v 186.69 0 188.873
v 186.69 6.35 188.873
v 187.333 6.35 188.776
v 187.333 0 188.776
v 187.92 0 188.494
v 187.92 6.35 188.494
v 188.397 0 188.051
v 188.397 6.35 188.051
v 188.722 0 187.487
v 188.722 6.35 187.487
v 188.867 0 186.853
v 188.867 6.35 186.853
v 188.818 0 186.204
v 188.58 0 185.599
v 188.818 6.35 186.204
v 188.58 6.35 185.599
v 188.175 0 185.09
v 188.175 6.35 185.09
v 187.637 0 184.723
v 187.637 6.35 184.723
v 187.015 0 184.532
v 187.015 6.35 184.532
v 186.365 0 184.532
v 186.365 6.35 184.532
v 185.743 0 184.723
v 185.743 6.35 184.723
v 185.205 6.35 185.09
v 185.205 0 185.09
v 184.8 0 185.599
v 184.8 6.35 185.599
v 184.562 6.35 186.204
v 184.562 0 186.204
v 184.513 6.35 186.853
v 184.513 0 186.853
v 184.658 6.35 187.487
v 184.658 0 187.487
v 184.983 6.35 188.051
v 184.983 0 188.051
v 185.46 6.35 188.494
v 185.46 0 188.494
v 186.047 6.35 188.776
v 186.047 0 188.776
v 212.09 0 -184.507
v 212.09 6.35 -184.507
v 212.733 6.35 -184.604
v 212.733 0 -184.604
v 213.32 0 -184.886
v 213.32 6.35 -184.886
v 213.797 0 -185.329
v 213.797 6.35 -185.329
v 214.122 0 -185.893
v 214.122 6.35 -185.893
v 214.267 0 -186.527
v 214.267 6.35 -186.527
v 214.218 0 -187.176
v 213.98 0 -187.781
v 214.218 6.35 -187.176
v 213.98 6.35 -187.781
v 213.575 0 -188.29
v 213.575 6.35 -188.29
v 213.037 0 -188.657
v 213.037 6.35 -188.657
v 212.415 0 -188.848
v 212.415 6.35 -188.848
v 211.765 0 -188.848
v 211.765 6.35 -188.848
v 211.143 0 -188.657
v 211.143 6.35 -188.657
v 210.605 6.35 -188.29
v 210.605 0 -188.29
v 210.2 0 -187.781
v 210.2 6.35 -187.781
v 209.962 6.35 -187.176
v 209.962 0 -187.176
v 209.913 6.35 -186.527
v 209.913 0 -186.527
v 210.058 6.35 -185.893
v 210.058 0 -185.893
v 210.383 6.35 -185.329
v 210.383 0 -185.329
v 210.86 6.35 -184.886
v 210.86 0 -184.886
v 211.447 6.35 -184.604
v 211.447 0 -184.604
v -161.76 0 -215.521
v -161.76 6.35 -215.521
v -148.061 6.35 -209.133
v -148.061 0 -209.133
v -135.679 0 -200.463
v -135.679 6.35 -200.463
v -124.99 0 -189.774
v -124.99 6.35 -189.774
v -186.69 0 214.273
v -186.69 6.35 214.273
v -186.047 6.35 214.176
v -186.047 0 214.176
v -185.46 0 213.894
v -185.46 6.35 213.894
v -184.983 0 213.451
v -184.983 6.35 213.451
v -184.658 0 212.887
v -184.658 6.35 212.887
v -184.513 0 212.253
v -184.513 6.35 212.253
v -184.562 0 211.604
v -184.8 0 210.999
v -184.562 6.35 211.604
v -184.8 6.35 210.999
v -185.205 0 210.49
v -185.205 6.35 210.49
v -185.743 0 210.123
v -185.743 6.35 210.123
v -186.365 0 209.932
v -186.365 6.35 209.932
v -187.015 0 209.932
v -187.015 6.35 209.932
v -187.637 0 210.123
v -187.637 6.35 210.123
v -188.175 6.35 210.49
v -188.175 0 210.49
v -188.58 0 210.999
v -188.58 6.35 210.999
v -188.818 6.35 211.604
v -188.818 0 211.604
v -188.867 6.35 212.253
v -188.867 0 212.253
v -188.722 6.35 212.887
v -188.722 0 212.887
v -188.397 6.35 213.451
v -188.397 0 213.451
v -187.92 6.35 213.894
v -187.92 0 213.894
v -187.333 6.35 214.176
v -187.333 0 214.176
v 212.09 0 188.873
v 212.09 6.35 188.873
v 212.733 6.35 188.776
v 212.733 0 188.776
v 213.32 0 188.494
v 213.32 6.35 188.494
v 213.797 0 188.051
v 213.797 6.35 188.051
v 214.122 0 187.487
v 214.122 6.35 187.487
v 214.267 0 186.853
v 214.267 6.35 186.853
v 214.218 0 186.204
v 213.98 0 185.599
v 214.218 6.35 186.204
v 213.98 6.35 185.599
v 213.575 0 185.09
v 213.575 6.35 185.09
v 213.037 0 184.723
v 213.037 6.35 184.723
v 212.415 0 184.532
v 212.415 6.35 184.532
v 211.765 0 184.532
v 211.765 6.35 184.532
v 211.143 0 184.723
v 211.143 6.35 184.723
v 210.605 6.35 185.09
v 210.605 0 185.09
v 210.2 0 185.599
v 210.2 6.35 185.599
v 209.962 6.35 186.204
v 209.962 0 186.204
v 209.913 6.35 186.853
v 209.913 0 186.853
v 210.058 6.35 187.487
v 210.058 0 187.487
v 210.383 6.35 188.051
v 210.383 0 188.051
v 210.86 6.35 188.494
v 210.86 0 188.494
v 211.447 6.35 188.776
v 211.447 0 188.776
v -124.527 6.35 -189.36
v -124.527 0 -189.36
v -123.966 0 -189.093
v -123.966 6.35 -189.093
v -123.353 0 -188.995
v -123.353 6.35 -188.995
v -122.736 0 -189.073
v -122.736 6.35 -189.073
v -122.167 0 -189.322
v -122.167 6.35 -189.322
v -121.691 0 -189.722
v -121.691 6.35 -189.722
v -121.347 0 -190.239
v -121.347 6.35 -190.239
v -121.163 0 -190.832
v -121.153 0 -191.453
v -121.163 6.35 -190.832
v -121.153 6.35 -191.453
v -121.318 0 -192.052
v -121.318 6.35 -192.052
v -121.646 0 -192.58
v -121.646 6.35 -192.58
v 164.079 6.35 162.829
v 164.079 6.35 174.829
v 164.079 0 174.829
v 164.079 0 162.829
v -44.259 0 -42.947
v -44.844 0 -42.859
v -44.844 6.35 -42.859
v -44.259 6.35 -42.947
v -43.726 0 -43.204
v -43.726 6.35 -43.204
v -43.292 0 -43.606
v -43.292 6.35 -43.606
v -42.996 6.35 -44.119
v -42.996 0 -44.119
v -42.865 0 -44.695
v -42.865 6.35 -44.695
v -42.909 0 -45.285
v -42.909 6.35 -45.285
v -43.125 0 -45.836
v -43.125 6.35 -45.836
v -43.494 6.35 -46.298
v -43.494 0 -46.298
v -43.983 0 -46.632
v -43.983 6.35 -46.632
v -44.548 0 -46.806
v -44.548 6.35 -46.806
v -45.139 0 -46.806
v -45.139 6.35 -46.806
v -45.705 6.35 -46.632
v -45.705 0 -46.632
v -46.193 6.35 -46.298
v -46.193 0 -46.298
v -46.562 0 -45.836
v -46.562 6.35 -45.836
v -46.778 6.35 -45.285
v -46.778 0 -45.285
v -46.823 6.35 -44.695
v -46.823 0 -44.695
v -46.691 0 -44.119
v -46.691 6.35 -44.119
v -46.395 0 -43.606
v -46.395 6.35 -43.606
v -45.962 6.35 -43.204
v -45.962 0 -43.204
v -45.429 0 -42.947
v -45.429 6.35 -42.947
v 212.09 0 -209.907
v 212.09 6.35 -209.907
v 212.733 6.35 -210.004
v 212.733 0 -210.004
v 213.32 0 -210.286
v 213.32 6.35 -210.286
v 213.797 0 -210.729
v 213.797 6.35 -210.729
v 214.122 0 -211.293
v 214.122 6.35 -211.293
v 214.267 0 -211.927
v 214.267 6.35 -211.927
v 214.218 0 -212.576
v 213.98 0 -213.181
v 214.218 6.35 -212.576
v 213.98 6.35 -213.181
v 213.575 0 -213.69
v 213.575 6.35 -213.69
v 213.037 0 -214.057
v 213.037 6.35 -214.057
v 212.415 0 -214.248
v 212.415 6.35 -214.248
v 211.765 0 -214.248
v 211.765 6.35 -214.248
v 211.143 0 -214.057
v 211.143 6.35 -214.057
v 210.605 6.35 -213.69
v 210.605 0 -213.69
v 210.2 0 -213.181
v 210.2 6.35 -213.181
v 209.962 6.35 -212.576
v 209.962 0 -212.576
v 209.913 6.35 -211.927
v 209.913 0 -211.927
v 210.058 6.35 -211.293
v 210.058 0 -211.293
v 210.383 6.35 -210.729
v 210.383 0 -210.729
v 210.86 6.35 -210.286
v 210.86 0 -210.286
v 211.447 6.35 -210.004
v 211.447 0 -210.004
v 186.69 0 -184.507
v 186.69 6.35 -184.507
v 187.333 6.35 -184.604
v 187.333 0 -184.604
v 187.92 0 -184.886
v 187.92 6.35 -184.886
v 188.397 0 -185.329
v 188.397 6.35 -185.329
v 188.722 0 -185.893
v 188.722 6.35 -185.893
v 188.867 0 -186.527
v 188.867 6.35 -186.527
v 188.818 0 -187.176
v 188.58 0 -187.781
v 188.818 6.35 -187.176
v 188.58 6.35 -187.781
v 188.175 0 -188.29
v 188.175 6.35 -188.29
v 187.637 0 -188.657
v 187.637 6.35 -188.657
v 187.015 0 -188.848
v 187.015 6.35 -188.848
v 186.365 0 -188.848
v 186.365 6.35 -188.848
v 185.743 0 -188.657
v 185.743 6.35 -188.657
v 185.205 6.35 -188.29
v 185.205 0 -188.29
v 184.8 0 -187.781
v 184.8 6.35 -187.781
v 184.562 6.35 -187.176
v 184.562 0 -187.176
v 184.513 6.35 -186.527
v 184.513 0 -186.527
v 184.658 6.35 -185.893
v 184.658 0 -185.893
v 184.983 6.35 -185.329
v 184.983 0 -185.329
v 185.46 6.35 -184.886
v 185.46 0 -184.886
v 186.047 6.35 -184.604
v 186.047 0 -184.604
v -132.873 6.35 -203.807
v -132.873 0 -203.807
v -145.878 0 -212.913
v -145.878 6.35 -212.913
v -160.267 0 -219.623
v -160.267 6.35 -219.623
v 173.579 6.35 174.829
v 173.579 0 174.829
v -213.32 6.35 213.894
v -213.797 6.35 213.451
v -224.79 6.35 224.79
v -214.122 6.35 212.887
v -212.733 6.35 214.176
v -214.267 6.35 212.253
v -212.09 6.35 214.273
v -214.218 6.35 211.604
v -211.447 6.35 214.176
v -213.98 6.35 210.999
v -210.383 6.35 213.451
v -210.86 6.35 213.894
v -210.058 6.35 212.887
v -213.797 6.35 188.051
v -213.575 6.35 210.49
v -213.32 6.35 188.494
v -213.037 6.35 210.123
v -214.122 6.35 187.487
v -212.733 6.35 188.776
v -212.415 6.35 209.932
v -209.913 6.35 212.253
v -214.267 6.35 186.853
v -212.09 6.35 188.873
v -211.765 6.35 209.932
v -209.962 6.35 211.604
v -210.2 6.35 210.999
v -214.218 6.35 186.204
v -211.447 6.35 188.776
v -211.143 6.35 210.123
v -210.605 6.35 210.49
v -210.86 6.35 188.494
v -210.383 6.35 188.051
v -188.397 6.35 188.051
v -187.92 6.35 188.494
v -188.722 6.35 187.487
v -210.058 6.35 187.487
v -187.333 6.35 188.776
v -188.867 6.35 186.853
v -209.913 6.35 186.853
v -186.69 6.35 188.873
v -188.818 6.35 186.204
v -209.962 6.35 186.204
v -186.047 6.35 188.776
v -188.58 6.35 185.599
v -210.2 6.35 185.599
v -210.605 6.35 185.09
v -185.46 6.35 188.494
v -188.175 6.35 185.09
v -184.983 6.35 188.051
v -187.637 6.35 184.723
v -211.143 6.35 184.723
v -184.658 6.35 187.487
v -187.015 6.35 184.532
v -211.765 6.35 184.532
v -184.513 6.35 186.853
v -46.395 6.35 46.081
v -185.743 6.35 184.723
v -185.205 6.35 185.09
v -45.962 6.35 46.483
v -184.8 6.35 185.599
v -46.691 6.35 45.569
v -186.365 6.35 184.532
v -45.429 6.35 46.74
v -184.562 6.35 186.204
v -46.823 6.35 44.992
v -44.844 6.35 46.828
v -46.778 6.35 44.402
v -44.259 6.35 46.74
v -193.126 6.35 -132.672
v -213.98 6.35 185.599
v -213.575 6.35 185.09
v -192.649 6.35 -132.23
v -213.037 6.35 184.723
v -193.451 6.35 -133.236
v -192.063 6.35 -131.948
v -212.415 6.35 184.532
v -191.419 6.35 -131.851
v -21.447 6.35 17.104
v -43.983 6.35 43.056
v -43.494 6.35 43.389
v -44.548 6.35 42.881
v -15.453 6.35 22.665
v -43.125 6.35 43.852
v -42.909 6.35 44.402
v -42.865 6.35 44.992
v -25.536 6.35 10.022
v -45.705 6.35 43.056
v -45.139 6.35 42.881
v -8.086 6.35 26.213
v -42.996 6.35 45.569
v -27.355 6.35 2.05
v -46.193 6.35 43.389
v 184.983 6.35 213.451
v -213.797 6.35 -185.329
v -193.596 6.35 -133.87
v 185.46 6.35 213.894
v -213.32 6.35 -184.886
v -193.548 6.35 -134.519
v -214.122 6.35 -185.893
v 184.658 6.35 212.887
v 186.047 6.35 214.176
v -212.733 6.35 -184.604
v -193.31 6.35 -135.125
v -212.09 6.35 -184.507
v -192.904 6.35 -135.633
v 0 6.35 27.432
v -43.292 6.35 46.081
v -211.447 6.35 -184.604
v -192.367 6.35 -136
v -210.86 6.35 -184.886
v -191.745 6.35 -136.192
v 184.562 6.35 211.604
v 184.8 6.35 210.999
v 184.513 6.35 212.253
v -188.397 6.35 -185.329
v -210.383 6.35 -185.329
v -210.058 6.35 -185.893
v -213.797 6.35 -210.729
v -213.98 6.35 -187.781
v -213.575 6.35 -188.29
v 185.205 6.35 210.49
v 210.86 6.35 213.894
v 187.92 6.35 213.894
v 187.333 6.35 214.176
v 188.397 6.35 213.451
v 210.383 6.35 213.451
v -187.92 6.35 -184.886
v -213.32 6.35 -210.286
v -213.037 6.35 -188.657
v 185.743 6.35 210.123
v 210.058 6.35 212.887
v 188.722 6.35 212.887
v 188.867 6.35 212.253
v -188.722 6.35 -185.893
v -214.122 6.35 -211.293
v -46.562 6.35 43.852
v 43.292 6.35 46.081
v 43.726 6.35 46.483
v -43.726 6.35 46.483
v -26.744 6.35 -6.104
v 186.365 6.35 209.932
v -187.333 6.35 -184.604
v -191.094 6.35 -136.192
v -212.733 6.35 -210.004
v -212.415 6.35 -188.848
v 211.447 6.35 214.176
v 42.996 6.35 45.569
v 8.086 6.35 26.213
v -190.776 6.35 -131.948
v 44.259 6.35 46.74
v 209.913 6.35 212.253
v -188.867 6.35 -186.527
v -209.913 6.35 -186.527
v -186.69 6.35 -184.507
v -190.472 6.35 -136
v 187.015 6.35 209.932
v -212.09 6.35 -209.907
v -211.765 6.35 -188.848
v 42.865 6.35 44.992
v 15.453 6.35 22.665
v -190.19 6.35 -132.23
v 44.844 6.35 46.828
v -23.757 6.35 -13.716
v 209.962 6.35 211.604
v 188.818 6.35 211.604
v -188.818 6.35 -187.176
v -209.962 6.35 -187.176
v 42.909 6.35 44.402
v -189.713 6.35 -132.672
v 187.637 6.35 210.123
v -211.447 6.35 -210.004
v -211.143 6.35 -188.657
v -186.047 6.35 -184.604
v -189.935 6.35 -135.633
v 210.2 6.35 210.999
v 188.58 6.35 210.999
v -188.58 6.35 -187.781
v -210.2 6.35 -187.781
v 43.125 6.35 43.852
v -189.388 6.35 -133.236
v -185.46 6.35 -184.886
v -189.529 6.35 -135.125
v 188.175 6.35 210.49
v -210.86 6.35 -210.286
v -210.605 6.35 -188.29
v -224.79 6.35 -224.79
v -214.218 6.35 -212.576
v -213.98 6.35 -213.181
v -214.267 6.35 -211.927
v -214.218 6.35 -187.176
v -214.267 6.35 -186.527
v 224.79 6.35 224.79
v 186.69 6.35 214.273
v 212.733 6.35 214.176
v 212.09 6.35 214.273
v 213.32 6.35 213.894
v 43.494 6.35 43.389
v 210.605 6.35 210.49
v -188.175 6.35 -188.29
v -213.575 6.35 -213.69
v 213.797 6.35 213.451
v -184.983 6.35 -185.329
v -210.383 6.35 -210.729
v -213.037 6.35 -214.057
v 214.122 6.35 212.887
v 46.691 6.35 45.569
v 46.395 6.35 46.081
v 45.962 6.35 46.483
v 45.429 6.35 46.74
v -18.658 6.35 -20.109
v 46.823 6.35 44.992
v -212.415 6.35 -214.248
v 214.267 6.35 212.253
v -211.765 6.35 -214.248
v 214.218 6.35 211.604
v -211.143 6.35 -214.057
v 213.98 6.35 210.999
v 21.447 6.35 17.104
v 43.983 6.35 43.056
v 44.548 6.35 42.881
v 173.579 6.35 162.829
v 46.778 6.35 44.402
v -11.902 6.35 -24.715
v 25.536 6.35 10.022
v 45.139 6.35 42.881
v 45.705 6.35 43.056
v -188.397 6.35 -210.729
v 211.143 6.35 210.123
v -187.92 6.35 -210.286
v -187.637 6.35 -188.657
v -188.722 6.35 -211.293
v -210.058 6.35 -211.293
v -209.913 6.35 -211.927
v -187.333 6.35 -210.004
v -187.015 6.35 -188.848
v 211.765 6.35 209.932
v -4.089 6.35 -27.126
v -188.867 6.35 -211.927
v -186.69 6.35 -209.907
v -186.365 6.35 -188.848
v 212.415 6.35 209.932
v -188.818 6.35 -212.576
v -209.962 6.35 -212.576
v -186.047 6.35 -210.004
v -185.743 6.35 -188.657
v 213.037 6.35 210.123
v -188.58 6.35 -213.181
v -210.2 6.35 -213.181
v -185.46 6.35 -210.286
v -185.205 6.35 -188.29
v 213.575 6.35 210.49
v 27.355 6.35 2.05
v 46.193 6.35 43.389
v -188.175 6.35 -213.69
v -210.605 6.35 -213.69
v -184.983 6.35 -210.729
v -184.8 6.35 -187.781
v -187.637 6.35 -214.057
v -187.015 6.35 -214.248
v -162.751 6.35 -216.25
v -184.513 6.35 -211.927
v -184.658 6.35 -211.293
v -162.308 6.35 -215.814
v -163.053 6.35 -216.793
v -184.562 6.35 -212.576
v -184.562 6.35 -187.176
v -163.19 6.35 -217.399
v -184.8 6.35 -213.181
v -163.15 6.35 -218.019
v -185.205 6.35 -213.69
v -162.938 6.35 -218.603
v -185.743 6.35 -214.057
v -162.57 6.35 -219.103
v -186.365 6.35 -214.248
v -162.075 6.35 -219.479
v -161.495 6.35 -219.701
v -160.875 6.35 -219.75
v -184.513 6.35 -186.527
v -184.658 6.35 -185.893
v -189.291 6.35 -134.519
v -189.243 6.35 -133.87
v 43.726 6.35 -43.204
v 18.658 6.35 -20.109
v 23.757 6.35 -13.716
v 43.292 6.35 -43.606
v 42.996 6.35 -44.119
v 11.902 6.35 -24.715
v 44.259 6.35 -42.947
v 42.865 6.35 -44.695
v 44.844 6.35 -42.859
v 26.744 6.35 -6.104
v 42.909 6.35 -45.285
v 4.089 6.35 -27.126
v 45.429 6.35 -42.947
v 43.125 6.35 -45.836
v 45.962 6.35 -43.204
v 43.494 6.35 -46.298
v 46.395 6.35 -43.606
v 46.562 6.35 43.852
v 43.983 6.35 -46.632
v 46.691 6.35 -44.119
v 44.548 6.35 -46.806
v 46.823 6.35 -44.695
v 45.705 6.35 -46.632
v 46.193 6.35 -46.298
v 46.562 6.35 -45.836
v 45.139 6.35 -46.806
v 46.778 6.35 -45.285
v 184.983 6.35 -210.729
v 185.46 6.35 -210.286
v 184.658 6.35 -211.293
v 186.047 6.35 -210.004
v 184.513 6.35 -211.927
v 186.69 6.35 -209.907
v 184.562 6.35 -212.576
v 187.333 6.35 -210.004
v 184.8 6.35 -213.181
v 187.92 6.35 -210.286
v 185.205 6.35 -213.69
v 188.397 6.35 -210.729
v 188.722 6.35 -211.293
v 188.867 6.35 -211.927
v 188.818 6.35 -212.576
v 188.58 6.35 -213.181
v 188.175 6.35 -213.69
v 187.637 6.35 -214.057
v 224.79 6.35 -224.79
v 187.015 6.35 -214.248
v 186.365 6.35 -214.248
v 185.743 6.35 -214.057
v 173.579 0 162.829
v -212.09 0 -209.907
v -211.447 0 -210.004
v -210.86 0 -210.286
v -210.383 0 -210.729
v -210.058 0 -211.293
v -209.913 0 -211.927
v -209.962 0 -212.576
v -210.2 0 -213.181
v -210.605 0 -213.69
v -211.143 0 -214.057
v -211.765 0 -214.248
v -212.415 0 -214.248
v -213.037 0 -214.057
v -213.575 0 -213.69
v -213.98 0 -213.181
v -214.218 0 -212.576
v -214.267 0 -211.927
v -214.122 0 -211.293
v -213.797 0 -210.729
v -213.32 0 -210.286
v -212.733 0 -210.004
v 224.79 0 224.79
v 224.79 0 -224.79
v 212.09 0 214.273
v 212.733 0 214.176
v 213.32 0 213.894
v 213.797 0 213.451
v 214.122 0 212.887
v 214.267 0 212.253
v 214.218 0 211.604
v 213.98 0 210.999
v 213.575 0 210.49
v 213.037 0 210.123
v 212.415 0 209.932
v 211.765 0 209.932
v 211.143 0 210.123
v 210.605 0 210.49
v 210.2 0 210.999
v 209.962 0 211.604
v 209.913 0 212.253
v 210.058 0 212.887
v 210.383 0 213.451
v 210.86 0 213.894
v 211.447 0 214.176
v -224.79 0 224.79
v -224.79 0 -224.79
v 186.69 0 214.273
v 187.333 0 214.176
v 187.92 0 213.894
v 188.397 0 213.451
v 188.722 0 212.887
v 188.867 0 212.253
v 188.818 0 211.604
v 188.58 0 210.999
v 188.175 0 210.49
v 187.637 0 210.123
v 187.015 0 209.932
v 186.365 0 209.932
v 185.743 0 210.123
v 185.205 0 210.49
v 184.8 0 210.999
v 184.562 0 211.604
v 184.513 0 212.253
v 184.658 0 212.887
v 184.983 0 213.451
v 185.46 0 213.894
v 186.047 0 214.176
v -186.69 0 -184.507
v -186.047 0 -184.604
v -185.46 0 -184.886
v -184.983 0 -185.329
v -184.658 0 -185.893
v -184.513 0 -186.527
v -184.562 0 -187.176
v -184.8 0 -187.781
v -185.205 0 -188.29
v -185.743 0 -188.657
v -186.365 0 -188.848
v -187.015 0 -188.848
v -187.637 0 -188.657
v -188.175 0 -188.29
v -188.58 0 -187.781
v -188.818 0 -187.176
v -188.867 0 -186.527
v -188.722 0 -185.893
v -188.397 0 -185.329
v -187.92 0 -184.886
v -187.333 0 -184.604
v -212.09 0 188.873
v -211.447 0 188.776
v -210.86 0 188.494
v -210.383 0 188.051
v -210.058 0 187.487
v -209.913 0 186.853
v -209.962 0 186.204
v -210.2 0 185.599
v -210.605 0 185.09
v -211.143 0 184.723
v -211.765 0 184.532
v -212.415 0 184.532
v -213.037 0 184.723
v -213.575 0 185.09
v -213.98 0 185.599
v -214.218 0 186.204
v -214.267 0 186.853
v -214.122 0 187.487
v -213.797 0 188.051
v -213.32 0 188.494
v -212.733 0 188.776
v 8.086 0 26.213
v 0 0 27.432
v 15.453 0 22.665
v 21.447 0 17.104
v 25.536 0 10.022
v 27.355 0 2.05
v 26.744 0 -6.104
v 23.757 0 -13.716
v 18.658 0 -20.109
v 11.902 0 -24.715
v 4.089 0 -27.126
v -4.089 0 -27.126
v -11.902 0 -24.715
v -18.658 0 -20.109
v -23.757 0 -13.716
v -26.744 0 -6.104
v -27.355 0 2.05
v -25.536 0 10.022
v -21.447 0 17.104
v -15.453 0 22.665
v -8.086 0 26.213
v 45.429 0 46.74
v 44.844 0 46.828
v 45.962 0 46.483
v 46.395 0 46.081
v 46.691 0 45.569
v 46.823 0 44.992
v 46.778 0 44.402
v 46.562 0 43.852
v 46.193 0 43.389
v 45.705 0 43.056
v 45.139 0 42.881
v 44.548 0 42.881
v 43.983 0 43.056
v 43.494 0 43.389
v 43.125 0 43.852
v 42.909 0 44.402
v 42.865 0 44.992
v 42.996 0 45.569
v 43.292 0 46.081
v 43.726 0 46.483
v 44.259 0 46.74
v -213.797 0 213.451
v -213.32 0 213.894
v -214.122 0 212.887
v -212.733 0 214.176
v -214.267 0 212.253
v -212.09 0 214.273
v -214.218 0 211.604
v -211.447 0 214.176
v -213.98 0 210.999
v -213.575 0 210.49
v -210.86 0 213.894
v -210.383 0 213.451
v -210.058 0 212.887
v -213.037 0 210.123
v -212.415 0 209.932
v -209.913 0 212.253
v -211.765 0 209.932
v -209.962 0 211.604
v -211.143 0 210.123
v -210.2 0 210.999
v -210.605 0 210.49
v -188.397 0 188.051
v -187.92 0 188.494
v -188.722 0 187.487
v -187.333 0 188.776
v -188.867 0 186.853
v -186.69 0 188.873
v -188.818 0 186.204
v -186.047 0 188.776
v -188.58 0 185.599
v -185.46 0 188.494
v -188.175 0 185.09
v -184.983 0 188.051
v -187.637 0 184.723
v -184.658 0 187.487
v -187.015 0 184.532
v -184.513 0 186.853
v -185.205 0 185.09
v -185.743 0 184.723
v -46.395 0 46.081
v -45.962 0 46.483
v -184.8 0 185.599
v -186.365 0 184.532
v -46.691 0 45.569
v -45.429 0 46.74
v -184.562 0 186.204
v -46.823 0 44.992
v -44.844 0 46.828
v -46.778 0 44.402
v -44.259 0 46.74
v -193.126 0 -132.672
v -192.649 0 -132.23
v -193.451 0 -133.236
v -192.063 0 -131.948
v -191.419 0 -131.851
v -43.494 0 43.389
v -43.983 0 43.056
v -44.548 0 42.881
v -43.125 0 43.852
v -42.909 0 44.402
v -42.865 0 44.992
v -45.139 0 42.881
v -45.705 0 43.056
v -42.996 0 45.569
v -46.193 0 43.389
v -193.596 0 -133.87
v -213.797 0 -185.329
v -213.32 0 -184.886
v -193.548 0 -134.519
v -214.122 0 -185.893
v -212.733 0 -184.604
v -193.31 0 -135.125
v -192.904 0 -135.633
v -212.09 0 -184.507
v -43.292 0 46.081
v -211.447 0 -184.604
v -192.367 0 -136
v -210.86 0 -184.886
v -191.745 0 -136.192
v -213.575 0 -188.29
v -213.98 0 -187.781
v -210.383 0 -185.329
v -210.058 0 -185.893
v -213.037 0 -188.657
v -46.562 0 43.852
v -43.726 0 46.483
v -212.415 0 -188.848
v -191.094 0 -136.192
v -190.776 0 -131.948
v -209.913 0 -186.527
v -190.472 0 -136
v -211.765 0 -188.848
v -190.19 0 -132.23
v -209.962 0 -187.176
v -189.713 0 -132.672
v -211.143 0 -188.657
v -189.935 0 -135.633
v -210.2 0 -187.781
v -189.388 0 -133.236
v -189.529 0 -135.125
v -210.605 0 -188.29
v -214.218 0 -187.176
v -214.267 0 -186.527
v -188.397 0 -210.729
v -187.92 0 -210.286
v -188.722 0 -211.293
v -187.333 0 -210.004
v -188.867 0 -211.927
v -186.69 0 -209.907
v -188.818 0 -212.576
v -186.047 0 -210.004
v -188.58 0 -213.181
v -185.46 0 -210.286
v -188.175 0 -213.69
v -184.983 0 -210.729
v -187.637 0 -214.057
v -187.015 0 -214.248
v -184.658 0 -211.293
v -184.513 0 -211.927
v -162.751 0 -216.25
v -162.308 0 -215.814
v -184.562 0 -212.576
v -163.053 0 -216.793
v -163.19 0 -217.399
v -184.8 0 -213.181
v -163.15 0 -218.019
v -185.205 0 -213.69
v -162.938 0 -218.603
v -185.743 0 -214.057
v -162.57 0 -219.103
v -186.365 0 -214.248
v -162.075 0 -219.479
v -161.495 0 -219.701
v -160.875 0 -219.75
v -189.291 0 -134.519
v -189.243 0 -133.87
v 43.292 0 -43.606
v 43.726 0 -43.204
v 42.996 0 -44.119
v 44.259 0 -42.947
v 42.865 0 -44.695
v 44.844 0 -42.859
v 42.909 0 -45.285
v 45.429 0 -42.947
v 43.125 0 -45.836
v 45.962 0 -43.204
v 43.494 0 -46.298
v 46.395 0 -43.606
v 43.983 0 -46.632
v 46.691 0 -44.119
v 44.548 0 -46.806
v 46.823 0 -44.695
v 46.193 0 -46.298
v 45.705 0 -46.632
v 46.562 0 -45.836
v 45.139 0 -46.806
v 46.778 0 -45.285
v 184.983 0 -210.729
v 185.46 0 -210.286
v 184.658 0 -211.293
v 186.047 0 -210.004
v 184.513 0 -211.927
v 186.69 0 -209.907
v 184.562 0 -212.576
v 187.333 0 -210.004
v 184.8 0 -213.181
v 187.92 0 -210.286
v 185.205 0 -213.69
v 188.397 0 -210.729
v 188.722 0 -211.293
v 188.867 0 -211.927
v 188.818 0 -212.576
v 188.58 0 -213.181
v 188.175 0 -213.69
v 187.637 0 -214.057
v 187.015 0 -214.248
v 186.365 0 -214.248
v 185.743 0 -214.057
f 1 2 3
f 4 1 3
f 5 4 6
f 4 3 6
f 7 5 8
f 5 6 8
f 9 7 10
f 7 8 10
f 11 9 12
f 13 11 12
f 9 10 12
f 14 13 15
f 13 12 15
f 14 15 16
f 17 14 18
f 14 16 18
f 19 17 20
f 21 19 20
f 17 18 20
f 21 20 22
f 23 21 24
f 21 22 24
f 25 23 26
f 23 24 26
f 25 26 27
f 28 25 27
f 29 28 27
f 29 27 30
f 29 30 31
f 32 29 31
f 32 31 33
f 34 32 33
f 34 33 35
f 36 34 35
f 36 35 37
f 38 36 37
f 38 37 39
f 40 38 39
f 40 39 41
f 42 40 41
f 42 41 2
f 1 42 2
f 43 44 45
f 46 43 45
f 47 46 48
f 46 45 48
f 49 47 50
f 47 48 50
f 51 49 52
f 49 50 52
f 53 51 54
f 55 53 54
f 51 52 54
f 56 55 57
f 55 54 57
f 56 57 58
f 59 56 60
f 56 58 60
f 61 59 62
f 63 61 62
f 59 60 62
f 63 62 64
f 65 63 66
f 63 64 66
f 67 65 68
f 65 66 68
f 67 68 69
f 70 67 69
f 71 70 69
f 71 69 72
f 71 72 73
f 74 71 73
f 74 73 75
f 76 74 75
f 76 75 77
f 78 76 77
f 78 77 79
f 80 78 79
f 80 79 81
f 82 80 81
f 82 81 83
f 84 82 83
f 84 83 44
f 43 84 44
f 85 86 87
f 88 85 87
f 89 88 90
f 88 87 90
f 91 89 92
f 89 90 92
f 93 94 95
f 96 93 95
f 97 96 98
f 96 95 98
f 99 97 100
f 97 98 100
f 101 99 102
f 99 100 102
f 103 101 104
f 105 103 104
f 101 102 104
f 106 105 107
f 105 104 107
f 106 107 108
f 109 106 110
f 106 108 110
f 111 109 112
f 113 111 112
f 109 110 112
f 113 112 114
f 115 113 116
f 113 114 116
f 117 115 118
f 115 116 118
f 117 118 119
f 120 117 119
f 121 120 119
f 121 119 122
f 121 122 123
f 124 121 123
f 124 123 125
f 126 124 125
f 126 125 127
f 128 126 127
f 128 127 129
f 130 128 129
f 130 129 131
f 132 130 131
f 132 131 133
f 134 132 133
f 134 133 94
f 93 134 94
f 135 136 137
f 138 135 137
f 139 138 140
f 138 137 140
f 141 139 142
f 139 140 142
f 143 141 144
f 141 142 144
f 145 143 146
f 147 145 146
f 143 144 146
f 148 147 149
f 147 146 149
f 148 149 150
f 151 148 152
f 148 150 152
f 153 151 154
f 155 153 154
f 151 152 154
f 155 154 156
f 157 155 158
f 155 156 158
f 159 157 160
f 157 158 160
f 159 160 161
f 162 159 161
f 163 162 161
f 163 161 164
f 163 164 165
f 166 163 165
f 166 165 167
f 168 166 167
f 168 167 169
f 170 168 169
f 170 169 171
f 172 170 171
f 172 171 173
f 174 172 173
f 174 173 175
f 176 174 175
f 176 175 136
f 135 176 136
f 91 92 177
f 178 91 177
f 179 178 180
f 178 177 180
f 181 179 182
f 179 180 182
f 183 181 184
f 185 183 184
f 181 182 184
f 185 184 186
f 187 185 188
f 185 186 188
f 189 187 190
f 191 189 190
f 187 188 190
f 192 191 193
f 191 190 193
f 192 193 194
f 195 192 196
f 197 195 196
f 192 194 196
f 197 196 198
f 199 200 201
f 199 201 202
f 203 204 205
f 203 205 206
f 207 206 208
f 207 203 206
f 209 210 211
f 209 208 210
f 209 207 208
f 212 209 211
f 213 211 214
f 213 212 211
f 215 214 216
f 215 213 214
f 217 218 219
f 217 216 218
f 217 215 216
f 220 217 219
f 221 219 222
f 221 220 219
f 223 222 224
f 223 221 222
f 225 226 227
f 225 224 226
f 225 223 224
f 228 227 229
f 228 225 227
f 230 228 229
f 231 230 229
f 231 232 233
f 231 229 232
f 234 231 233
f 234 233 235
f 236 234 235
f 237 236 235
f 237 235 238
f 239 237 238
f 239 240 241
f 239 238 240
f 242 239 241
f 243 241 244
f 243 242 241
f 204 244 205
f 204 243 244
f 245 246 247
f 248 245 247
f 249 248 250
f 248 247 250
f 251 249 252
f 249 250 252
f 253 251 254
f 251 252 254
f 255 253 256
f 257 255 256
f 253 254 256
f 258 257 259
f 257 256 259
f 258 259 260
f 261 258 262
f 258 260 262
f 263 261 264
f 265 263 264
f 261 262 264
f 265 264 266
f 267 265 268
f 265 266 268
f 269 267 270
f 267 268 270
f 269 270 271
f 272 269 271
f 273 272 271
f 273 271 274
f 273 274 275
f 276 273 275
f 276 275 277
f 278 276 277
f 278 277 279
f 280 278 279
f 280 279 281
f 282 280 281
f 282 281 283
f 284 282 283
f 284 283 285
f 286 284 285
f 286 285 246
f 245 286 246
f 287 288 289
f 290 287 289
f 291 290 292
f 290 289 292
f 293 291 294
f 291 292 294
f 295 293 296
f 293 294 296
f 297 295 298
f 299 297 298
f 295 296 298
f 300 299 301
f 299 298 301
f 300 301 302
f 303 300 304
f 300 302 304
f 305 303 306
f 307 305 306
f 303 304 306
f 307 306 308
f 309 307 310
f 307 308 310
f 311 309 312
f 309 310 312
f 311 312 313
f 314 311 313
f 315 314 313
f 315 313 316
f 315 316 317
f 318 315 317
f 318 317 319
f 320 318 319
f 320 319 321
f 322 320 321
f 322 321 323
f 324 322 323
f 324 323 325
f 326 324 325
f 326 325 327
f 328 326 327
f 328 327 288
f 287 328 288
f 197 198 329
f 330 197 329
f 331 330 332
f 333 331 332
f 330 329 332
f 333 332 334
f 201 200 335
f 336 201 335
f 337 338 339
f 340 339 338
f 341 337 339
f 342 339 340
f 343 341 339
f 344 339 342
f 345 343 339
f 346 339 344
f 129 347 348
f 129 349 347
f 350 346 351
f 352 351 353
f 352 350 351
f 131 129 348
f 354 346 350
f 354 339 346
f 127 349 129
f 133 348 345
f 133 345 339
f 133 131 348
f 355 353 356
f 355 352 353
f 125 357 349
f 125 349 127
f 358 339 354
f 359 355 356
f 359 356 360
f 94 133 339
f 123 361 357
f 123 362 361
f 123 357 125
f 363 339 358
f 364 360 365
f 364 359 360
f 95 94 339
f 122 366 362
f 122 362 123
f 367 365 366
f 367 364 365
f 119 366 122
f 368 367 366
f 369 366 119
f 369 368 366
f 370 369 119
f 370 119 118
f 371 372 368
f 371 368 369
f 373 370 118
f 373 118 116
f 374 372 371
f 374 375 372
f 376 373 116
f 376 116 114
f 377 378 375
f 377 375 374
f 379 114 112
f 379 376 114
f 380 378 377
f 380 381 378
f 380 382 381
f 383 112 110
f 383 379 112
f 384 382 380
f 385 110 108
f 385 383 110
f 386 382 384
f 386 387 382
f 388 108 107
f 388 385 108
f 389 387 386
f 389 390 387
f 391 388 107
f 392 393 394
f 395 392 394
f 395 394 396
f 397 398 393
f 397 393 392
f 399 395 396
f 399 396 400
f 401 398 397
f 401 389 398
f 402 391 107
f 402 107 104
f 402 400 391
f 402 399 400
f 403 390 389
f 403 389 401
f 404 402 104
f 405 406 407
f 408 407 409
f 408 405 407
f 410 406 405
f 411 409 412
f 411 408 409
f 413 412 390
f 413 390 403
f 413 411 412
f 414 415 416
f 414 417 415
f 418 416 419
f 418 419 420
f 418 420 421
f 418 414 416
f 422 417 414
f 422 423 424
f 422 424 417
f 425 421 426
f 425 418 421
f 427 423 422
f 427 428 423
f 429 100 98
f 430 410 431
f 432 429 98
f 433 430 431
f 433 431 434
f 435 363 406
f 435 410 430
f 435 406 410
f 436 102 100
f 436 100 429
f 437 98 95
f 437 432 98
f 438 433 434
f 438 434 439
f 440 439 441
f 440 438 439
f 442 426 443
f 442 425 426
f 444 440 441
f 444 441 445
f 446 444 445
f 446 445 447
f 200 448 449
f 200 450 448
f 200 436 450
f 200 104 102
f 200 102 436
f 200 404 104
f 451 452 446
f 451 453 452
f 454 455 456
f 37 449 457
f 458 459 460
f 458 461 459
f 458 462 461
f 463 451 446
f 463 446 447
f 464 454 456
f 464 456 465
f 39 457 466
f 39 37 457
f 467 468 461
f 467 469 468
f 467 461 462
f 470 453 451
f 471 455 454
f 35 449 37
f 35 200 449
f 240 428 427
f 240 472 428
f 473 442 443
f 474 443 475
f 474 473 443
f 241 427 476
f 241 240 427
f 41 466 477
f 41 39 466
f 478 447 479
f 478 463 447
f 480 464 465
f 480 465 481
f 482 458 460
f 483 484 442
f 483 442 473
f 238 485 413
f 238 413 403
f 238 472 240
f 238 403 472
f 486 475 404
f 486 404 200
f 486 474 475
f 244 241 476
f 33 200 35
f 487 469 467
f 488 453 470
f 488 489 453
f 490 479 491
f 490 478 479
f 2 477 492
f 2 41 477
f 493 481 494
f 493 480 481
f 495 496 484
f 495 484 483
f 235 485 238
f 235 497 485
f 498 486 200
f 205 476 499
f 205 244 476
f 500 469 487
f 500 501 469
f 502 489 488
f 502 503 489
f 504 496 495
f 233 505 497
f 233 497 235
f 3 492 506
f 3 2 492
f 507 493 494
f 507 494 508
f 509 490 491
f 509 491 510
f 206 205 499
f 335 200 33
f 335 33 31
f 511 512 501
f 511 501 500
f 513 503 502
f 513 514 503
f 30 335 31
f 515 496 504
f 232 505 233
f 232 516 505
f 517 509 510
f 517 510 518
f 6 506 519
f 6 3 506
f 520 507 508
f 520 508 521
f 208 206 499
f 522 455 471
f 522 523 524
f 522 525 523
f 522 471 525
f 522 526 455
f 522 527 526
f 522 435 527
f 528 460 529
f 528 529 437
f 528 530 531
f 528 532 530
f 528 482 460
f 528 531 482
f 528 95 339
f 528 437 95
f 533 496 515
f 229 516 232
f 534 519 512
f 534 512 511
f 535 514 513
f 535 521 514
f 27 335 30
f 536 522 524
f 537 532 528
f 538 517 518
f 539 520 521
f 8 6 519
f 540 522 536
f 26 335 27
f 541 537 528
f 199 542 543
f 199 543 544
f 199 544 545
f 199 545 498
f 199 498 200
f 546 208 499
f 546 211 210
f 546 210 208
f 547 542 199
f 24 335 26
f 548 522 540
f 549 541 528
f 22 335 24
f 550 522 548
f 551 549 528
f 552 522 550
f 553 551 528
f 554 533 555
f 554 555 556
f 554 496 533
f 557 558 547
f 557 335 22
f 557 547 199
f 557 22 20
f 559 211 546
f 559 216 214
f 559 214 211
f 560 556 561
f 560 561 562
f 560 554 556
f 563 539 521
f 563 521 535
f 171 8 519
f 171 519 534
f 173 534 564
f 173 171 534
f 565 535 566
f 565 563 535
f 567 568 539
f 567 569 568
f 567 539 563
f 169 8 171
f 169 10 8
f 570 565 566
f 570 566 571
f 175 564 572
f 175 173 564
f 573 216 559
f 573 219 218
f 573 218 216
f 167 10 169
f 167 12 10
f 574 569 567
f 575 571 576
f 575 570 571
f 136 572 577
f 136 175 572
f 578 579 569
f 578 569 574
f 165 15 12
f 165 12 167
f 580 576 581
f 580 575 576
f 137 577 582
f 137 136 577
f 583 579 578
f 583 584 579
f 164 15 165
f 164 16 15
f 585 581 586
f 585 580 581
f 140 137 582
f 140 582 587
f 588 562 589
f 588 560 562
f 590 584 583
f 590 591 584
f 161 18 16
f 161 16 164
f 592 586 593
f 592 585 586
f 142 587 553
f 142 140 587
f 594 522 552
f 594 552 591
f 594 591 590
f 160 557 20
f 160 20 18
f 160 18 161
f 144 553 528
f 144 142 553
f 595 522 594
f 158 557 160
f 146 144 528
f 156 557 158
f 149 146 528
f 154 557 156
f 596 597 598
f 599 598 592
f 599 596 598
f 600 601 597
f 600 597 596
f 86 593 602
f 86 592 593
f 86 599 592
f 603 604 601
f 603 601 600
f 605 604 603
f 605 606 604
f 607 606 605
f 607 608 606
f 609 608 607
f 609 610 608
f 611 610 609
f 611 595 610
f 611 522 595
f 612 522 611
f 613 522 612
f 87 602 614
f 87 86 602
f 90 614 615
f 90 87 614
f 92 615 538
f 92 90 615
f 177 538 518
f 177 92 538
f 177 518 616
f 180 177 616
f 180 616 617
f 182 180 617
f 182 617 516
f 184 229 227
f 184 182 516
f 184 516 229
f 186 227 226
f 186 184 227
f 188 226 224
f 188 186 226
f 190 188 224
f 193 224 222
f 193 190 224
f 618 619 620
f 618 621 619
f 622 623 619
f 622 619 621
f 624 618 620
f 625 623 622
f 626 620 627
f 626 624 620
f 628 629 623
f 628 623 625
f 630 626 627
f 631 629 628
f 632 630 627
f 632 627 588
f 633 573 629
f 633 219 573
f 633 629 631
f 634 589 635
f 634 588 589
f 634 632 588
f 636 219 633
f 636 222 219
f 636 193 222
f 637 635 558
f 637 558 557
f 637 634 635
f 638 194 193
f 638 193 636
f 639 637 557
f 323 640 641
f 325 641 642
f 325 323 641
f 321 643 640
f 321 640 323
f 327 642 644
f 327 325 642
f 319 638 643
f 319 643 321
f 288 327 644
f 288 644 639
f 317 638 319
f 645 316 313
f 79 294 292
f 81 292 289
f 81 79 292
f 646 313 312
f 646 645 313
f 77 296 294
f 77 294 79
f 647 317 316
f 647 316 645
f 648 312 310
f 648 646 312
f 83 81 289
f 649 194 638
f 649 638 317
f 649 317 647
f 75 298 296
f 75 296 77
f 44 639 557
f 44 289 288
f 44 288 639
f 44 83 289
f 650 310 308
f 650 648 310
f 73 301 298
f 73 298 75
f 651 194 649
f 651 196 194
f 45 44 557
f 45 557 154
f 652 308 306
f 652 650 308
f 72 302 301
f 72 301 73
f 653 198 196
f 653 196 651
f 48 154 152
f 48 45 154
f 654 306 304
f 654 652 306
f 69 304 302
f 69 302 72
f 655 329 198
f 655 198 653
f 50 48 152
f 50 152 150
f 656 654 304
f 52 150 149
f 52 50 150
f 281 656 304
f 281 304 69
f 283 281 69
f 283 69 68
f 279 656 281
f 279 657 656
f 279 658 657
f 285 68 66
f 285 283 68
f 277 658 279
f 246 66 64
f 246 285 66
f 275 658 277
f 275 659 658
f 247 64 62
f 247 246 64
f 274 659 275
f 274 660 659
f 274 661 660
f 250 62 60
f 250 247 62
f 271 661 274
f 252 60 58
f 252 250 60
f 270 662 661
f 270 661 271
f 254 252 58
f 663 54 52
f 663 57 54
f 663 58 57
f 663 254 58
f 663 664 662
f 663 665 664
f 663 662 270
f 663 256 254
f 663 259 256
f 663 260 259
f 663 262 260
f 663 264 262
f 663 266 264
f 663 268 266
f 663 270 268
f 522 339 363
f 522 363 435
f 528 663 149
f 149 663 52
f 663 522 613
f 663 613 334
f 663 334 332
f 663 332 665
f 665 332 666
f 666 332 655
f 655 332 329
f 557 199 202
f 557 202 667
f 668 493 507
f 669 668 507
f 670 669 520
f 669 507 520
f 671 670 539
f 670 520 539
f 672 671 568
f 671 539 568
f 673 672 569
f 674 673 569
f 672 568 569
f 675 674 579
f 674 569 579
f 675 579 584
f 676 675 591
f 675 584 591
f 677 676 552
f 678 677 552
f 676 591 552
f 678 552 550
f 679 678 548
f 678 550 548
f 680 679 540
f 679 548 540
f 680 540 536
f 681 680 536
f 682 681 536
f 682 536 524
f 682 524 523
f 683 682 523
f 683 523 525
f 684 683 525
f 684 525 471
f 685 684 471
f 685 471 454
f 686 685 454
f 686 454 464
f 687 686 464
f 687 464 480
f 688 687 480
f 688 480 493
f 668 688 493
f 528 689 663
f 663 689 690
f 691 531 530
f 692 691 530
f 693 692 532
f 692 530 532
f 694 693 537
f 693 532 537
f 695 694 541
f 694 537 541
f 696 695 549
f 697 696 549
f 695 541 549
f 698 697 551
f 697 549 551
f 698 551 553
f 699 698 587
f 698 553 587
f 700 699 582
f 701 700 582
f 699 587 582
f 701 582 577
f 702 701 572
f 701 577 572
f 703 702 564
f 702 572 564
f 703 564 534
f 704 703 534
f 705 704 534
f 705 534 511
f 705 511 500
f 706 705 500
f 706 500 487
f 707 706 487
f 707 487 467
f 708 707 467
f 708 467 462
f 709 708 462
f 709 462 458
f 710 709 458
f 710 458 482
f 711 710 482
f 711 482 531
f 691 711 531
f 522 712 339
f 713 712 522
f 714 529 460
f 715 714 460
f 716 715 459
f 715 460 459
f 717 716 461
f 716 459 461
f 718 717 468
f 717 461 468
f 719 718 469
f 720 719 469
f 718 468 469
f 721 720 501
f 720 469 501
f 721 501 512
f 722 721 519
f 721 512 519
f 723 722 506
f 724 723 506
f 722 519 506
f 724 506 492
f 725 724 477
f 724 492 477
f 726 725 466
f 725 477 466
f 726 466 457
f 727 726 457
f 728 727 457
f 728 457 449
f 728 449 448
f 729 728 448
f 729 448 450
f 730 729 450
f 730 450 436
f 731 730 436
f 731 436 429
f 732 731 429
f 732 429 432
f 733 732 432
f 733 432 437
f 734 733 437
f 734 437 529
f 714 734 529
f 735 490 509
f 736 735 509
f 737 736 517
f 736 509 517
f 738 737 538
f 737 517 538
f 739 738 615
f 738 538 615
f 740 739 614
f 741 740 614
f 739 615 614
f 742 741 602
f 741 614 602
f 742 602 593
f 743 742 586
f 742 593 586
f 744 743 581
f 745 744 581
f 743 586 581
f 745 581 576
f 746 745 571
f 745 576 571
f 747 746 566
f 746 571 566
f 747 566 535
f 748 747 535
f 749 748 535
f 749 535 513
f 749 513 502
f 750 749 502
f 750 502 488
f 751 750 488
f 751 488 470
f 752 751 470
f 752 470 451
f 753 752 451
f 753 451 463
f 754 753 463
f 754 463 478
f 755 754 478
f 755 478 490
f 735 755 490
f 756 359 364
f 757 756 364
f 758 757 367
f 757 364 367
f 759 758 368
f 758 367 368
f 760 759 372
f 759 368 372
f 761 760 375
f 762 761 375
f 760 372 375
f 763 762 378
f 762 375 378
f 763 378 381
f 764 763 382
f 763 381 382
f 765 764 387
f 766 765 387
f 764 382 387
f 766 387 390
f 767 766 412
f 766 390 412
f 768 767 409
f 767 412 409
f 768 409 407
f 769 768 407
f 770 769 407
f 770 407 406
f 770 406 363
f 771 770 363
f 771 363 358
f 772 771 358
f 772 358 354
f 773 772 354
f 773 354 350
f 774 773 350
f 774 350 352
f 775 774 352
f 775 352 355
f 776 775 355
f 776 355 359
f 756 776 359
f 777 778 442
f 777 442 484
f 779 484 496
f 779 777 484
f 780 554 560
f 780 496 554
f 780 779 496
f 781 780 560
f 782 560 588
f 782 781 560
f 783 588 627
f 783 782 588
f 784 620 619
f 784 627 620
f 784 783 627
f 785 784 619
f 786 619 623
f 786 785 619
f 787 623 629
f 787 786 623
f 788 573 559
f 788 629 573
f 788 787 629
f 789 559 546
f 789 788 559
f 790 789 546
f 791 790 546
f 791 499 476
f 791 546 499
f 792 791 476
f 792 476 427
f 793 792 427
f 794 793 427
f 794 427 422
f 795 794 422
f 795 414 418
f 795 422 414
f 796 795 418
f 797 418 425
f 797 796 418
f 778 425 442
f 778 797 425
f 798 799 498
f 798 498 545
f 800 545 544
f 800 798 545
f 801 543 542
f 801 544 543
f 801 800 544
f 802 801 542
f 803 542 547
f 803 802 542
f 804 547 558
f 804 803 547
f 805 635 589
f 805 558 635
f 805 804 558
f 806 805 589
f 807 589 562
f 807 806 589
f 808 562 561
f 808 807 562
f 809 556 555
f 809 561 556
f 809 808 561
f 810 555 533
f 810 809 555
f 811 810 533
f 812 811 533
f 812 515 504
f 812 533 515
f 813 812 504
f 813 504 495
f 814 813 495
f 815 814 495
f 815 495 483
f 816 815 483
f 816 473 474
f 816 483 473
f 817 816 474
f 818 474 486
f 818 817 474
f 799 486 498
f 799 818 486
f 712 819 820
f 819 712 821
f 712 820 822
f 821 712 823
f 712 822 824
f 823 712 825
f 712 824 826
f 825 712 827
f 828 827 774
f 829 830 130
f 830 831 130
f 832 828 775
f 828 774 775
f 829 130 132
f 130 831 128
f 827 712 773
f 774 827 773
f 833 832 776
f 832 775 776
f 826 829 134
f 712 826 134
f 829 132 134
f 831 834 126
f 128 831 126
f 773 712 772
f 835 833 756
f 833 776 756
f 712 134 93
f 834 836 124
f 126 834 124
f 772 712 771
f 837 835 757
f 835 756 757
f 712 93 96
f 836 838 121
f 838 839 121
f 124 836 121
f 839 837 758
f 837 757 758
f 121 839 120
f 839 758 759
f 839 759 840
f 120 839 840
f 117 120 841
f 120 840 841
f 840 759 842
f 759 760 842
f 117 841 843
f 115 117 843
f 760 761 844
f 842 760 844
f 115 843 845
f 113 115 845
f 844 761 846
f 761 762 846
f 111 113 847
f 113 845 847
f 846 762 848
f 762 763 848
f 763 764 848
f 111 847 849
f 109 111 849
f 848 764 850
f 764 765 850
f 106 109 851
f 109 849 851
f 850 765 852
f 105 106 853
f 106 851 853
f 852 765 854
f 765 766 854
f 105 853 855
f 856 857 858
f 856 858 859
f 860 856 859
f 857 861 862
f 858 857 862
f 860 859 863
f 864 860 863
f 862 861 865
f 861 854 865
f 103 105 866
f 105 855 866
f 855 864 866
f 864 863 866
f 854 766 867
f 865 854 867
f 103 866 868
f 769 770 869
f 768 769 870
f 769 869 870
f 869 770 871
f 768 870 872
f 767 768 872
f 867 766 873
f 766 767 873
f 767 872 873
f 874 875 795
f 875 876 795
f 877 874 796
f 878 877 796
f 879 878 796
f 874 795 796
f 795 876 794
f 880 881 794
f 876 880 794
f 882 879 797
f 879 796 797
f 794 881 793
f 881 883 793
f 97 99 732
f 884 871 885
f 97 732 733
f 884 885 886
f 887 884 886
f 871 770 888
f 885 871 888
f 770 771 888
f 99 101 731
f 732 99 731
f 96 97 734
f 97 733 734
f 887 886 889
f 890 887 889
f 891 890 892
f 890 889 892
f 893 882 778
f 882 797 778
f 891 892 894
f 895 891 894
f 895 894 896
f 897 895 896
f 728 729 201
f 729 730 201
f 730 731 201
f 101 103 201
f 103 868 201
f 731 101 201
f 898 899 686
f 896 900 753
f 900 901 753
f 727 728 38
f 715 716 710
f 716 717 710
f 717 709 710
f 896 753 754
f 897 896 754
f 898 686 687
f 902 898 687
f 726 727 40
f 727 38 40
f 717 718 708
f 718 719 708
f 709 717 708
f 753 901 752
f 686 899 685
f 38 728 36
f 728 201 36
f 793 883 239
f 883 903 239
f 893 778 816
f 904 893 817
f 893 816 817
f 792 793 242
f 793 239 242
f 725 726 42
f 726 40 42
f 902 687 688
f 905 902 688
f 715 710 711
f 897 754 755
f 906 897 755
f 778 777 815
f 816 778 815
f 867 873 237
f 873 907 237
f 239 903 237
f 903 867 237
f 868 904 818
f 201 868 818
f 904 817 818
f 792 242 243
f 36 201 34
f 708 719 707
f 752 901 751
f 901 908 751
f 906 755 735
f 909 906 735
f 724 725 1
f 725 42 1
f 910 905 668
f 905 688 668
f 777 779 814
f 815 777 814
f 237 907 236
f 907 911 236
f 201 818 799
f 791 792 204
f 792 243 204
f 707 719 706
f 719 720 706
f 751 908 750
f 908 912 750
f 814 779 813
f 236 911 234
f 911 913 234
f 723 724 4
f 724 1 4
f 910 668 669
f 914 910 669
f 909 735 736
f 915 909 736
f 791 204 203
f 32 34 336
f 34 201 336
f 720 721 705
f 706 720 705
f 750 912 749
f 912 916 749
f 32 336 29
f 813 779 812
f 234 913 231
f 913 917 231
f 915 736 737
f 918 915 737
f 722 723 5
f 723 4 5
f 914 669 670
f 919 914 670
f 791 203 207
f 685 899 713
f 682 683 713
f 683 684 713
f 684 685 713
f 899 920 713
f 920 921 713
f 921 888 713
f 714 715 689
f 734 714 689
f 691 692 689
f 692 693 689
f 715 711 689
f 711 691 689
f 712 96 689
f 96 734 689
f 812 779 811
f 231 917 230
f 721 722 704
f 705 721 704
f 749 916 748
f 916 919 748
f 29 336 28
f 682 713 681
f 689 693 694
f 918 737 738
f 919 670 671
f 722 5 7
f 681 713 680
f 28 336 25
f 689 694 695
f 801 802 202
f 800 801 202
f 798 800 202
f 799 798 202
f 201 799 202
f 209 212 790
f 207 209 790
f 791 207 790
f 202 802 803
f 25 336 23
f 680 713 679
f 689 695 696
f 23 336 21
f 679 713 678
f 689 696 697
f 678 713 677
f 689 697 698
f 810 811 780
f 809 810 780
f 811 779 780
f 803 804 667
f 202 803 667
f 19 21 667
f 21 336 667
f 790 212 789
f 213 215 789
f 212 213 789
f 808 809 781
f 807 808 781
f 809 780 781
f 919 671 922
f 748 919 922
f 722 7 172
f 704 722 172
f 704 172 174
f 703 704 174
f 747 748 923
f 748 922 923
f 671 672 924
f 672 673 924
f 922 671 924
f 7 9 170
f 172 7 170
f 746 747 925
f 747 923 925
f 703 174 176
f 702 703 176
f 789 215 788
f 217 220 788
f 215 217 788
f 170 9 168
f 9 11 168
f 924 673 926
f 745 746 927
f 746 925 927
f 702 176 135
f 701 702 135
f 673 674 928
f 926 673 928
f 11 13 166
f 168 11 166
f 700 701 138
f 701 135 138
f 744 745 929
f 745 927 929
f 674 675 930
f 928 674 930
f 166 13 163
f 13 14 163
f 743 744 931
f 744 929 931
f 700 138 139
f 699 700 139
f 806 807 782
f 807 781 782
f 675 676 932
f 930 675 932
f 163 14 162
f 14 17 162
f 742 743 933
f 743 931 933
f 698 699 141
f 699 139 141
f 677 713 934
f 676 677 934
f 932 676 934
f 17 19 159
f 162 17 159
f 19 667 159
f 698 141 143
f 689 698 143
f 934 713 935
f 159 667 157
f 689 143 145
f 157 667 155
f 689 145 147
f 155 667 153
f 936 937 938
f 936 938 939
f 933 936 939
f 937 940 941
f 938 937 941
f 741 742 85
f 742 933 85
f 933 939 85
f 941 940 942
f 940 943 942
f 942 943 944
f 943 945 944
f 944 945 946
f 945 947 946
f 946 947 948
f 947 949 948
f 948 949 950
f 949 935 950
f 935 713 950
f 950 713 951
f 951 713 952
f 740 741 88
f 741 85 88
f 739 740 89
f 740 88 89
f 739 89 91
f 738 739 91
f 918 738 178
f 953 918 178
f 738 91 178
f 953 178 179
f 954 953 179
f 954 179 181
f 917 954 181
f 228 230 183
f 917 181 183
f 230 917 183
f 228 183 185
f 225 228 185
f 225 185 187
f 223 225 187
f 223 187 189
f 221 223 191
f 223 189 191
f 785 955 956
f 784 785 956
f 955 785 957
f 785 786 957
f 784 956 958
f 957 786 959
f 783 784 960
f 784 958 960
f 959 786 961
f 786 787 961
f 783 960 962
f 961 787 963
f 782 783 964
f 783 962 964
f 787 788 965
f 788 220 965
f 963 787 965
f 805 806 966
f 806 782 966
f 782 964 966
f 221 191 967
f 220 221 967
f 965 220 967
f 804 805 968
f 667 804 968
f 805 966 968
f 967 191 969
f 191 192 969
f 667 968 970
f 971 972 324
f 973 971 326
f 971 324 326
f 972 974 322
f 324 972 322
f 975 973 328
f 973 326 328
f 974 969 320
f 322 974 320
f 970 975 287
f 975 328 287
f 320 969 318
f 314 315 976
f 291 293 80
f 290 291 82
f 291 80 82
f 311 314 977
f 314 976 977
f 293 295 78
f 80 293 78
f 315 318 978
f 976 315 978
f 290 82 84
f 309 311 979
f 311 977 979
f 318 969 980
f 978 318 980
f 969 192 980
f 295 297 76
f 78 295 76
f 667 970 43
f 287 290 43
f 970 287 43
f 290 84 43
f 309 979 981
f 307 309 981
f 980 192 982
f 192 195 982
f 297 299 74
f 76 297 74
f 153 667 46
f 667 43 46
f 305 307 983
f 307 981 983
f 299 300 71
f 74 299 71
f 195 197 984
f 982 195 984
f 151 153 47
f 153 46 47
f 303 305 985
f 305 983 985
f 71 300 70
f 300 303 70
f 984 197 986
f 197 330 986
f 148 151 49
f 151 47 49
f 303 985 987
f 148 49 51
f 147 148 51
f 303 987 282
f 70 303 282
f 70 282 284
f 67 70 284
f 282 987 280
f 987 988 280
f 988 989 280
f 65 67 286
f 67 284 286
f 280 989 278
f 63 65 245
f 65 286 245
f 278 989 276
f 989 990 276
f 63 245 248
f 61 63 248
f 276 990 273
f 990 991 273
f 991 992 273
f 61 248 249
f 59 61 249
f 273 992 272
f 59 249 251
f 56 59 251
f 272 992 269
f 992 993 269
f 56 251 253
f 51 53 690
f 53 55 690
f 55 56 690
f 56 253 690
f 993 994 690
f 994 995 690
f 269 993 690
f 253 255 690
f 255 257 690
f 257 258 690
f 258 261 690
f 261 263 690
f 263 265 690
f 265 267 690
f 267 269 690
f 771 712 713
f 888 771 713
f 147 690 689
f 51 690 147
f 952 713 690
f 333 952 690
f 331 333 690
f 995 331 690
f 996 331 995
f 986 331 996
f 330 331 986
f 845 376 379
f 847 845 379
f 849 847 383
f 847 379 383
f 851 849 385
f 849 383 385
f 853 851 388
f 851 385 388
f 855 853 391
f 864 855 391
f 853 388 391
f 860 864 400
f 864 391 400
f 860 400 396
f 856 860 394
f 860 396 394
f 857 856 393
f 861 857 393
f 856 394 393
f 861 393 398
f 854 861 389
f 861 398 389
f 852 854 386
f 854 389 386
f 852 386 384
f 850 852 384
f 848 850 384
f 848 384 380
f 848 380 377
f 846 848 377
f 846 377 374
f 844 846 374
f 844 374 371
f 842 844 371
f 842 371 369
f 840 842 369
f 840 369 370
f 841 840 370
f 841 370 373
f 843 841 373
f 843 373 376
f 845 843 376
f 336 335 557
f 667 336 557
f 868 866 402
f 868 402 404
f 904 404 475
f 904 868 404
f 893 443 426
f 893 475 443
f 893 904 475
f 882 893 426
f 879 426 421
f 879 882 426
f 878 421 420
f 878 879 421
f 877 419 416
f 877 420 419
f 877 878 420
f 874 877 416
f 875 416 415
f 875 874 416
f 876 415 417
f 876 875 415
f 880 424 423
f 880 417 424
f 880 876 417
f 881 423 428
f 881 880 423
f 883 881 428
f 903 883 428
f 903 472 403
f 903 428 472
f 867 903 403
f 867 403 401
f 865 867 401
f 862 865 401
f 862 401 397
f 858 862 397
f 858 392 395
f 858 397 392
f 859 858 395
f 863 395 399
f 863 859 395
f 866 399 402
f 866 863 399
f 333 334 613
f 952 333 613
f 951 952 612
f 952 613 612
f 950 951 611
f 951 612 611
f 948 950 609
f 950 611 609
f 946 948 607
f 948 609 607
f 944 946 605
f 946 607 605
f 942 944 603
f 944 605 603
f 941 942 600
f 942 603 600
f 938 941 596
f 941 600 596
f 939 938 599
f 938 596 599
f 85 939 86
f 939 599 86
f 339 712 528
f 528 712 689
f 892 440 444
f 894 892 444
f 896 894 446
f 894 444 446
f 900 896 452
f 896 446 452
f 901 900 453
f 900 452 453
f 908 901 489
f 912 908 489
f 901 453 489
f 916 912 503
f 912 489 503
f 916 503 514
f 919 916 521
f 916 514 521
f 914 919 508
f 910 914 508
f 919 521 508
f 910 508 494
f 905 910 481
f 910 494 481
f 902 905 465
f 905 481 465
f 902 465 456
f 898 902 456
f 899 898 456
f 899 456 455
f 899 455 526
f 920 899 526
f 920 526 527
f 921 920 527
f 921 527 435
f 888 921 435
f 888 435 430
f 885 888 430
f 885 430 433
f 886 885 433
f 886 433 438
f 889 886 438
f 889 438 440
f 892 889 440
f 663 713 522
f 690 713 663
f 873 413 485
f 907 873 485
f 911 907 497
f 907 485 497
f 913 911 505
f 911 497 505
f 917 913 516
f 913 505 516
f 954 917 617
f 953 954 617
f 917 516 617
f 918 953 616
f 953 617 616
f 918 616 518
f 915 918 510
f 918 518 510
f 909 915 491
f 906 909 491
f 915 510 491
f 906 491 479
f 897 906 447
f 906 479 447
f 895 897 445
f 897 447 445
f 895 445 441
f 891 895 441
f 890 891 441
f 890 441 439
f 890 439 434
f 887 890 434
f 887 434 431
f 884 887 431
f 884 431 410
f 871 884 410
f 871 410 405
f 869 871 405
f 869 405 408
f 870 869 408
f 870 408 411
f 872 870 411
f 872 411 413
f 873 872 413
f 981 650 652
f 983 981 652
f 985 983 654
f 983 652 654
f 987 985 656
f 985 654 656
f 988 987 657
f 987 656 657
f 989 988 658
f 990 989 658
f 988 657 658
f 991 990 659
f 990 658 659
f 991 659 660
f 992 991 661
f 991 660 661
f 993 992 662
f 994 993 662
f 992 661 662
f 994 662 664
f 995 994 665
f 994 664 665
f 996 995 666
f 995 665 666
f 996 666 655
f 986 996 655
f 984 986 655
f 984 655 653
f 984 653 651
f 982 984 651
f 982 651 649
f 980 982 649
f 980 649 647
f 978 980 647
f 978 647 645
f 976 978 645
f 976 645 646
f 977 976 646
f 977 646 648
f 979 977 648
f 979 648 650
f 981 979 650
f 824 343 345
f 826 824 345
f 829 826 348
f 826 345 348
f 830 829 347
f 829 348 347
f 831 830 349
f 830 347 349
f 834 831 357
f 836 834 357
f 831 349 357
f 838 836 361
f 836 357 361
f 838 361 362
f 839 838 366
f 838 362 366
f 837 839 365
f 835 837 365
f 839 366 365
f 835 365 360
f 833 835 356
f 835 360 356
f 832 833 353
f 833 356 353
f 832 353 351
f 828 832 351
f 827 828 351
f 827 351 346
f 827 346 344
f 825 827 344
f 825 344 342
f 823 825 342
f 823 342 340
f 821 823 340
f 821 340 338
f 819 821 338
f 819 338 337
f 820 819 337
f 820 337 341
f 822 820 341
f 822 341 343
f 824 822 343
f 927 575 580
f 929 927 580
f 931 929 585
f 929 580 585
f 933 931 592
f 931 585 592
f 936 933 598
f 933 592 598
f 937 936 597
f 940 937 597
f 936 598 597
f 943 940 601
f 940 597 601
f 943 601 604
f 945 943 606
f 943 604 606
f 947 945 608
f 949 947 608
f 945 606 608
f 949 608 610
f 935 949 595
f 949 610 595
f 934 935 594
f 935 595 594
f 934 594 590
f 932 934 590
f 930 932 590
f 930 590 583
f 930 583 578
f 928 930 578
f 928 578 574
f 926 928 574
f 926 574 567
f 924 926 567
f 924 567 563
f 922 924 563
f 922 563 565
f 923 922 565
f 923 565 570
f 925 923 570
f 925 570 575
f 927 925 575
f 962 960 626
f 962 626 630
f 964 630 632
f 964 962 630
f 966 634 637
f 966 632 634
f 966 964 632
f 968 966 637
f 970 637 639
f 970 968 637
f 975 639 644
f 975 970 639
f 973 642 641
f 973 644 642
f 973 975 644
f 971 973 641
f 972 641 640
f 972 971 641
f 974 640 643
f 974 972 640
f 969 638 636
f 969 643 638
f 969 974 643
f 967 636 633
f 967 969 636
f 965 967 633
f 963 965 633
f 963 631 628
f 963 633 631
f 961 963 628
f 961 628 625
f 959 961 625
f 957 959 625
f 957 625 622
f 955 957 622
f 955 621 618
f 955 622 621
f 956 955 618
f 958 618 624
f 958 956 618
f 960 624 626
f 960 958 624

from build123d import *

# Parameters (mm, degrees)
SKETCH1_W               = 449.58
SKETCH1_H               = 449.58
BOSS_EXTRUDE1_DEPTH     = 6.35
CUT_EXTRUDE1_DEPTH      = 318.964480249
CUT_EXTRUDE1_DEPTH_BACK = 318.964480249
SKETCH2_R               = 1.984375
SKETCH2_R_2             = 27.432
SKETCH3_W               = 9.5
SKETCH3_H               = 12
CUT_EXTRUDE2_DEPTH      = 318.964480249
SKETCH4_R               = 2.1828125
CUT_EXTRUDE3_DEPTH      = 318.964480249
SKETCH5_R               = 2.1828125
CUT_EXTRUDE4_DEPTH      = 318.964480249


with BuildPart() as part:
    # Sketch1 → Boss-Extrude1 (new body)
    with BuildSketch(Plane(origin=(0, 0, 0), x_dir=(1, 0, 0), z_dir=(0, 1, 0))):
        Rectangle(SKETCH1_W, SKETCH1_H)
    extrude(amount=BOSS_EXTRUDE1_DEPTH)

    # Sketch2 → Cut-Extrude1 (cut, two sides: drawn at the far end of the back side and taken through both)
    with BuildSketch(Plane(origin=(0, 6.35, 0), x_dir=(1, 0, 0), z_dir=(0, 1, 0)).offset(-CUT_EXTRUDE1_DEPTH_BACK)):
        with Locations(Location((-44.8437, 44.8437, 0), (0, 0, 270))):
            Circle(SKETCH2_R)
        with Locations(Location((44.8437, 44.8437, 0), (0, 0, 270))):
            Circle(SKETCH2_R)
        with Locations(Location((-44.8437, -44.8437, 0), (0, 0, 270))):
            Circle(SKETCH2_R)
        with Locations(Location((44.8437, -44.8437, 0), (0, 0, 270))):
            Circle(SKETCH2_R)
        with Locations(Location((0, 0, 0), (0, 0, 270))):
            Circle(SKETCH2_R_2)
    extrude(amount=CUT_EXTRUDE1_DEPTH + CUT_EXTRUDE1_DEPTH_BACK, mode=Mode.SUBTRACT)

    # Sketch3 → Cut-Extrude2 (cut, through all)
    with BuildSketch(Plane(origin=(0, 6.35, 0), x_dir=(1, 0, 0), z_dir=(0, 1, 0))):
        with Locations((168.828815076, -168.828815076)):
            Rectangle(SKETCH3_W, SKETCH3_H)
    extrude(amount=-CUT_EXTRUDE2_DEPTH, mode=Mode.SUBTRACT)

    # Sketch4 → Cut-Extrude3 (cut, through all)
    with BuildSketch(Plane(origin=(0, 6.35, 0), x_dir=(1, 0, 0), z_dir=(0, 1, 0))):
        with Locations(Location((-212.09, 212.09, 0), (0, 0, 270))):
            Circle(SKETCH4_R)
        with Locations(Location((-186.69, 212.09, 0), (0, 0, 270))):
            Circle(SKETCH4_R)
        with Locations(Location((-212.09, 186.69, 0), (0, 0, 270))):
            Circle(SKETCH4_R)
        with Locations(Location((-186.69, 186.69, 0), (0, 0, 270))):
            Circle(SKETCH4_R)
        with Locations(Location((186.69, 212.09, 0), (0, 0, 270))):
            Circle(SKETCH4_R)
        with Locations(Location((186.69, 186.69, 0), (0, 0, 270))):
            Circle(SKETCH4_R)
        with Locations(Location((212.09, 186.69, 0), (0, 0, 270))):
            Circle(SKETCH4_R)
        with Locations(Location((212.09, 212.09, 0), (0, 0, 270))):
            Circle(SKETCH4_R)
        with Locations(Location((186.69, -186.69, 0), (0, 0, 270))):
            Circle(SKETCH4_R)
        with Locations(Location((212.09, -186.69, 0), (0, 0, 270))):
            Circle(SKETCH4_R)
        with Locations(Location((212.09, -212.09, 0), (0, 0, 270))):
            Circle(SKETCH4_R)
        with Locations(Location((186.69, -212.09, 0), (0, 0, 270))):
            Circle(SKETCH4_R)
        with Locations(Location((-212.09, -186.69, 0), (0, 0, 270))):
            Circle(SKETCH4_R)
        with Locations(Location((-186.69, -186.69, 0), (0, 0, 270))):
            Circle(SKETCH4_R)
        with Locations(Location((-186.69, -212.09, 0), (0, 0, 270))):
            Circle(SKETCH4_R)
        with Locations(Location((-212.09, -212.09, 0), (0, 0, 270))):
            Circle(SKETCH4_R)
    extrude(amount=-CUT_EXTRUDE3_DEPTH, mode=Mode.SUBTRACT)

    # Sketch5 → Cut-Extrude4 (cut, through all)
    with BuildSketch(Plane(origin=(0, 6.35, 0), x_dir=(1, 0, 0), z_dir=(0, 1, 0))):
        with Locations(Location((-191.419449709, 134.033341647, 0), (0, 0, 270))):
            Circle(SKETCH5_R)
        with BuildLine():
            ThreePointArc((-121.64596733, 192.580244977), (-139.176494703, 208.644013705), (-160.267293124, 219.623188433))
            ThreePointArc((-160.267293124, 219.623188433), (-163.065031767, 218.318581478), (-161.760424812, 215.520842836))
            ThreePointArc((-161.760424812, 215.520842836), (-141.680514333, 205.067903062), (-124.990230102, 189.774075318))
            ThreePointArc((-124.990230102, 189.774075318), (-121.915013887, 189.505028762), (-121.64596733, 192.580244977))
        make_face()
    extrude(amount=-CUT_EXTRUDE4_DEPTH, mode=Mode.SUBTRACT)


solid = part.part
